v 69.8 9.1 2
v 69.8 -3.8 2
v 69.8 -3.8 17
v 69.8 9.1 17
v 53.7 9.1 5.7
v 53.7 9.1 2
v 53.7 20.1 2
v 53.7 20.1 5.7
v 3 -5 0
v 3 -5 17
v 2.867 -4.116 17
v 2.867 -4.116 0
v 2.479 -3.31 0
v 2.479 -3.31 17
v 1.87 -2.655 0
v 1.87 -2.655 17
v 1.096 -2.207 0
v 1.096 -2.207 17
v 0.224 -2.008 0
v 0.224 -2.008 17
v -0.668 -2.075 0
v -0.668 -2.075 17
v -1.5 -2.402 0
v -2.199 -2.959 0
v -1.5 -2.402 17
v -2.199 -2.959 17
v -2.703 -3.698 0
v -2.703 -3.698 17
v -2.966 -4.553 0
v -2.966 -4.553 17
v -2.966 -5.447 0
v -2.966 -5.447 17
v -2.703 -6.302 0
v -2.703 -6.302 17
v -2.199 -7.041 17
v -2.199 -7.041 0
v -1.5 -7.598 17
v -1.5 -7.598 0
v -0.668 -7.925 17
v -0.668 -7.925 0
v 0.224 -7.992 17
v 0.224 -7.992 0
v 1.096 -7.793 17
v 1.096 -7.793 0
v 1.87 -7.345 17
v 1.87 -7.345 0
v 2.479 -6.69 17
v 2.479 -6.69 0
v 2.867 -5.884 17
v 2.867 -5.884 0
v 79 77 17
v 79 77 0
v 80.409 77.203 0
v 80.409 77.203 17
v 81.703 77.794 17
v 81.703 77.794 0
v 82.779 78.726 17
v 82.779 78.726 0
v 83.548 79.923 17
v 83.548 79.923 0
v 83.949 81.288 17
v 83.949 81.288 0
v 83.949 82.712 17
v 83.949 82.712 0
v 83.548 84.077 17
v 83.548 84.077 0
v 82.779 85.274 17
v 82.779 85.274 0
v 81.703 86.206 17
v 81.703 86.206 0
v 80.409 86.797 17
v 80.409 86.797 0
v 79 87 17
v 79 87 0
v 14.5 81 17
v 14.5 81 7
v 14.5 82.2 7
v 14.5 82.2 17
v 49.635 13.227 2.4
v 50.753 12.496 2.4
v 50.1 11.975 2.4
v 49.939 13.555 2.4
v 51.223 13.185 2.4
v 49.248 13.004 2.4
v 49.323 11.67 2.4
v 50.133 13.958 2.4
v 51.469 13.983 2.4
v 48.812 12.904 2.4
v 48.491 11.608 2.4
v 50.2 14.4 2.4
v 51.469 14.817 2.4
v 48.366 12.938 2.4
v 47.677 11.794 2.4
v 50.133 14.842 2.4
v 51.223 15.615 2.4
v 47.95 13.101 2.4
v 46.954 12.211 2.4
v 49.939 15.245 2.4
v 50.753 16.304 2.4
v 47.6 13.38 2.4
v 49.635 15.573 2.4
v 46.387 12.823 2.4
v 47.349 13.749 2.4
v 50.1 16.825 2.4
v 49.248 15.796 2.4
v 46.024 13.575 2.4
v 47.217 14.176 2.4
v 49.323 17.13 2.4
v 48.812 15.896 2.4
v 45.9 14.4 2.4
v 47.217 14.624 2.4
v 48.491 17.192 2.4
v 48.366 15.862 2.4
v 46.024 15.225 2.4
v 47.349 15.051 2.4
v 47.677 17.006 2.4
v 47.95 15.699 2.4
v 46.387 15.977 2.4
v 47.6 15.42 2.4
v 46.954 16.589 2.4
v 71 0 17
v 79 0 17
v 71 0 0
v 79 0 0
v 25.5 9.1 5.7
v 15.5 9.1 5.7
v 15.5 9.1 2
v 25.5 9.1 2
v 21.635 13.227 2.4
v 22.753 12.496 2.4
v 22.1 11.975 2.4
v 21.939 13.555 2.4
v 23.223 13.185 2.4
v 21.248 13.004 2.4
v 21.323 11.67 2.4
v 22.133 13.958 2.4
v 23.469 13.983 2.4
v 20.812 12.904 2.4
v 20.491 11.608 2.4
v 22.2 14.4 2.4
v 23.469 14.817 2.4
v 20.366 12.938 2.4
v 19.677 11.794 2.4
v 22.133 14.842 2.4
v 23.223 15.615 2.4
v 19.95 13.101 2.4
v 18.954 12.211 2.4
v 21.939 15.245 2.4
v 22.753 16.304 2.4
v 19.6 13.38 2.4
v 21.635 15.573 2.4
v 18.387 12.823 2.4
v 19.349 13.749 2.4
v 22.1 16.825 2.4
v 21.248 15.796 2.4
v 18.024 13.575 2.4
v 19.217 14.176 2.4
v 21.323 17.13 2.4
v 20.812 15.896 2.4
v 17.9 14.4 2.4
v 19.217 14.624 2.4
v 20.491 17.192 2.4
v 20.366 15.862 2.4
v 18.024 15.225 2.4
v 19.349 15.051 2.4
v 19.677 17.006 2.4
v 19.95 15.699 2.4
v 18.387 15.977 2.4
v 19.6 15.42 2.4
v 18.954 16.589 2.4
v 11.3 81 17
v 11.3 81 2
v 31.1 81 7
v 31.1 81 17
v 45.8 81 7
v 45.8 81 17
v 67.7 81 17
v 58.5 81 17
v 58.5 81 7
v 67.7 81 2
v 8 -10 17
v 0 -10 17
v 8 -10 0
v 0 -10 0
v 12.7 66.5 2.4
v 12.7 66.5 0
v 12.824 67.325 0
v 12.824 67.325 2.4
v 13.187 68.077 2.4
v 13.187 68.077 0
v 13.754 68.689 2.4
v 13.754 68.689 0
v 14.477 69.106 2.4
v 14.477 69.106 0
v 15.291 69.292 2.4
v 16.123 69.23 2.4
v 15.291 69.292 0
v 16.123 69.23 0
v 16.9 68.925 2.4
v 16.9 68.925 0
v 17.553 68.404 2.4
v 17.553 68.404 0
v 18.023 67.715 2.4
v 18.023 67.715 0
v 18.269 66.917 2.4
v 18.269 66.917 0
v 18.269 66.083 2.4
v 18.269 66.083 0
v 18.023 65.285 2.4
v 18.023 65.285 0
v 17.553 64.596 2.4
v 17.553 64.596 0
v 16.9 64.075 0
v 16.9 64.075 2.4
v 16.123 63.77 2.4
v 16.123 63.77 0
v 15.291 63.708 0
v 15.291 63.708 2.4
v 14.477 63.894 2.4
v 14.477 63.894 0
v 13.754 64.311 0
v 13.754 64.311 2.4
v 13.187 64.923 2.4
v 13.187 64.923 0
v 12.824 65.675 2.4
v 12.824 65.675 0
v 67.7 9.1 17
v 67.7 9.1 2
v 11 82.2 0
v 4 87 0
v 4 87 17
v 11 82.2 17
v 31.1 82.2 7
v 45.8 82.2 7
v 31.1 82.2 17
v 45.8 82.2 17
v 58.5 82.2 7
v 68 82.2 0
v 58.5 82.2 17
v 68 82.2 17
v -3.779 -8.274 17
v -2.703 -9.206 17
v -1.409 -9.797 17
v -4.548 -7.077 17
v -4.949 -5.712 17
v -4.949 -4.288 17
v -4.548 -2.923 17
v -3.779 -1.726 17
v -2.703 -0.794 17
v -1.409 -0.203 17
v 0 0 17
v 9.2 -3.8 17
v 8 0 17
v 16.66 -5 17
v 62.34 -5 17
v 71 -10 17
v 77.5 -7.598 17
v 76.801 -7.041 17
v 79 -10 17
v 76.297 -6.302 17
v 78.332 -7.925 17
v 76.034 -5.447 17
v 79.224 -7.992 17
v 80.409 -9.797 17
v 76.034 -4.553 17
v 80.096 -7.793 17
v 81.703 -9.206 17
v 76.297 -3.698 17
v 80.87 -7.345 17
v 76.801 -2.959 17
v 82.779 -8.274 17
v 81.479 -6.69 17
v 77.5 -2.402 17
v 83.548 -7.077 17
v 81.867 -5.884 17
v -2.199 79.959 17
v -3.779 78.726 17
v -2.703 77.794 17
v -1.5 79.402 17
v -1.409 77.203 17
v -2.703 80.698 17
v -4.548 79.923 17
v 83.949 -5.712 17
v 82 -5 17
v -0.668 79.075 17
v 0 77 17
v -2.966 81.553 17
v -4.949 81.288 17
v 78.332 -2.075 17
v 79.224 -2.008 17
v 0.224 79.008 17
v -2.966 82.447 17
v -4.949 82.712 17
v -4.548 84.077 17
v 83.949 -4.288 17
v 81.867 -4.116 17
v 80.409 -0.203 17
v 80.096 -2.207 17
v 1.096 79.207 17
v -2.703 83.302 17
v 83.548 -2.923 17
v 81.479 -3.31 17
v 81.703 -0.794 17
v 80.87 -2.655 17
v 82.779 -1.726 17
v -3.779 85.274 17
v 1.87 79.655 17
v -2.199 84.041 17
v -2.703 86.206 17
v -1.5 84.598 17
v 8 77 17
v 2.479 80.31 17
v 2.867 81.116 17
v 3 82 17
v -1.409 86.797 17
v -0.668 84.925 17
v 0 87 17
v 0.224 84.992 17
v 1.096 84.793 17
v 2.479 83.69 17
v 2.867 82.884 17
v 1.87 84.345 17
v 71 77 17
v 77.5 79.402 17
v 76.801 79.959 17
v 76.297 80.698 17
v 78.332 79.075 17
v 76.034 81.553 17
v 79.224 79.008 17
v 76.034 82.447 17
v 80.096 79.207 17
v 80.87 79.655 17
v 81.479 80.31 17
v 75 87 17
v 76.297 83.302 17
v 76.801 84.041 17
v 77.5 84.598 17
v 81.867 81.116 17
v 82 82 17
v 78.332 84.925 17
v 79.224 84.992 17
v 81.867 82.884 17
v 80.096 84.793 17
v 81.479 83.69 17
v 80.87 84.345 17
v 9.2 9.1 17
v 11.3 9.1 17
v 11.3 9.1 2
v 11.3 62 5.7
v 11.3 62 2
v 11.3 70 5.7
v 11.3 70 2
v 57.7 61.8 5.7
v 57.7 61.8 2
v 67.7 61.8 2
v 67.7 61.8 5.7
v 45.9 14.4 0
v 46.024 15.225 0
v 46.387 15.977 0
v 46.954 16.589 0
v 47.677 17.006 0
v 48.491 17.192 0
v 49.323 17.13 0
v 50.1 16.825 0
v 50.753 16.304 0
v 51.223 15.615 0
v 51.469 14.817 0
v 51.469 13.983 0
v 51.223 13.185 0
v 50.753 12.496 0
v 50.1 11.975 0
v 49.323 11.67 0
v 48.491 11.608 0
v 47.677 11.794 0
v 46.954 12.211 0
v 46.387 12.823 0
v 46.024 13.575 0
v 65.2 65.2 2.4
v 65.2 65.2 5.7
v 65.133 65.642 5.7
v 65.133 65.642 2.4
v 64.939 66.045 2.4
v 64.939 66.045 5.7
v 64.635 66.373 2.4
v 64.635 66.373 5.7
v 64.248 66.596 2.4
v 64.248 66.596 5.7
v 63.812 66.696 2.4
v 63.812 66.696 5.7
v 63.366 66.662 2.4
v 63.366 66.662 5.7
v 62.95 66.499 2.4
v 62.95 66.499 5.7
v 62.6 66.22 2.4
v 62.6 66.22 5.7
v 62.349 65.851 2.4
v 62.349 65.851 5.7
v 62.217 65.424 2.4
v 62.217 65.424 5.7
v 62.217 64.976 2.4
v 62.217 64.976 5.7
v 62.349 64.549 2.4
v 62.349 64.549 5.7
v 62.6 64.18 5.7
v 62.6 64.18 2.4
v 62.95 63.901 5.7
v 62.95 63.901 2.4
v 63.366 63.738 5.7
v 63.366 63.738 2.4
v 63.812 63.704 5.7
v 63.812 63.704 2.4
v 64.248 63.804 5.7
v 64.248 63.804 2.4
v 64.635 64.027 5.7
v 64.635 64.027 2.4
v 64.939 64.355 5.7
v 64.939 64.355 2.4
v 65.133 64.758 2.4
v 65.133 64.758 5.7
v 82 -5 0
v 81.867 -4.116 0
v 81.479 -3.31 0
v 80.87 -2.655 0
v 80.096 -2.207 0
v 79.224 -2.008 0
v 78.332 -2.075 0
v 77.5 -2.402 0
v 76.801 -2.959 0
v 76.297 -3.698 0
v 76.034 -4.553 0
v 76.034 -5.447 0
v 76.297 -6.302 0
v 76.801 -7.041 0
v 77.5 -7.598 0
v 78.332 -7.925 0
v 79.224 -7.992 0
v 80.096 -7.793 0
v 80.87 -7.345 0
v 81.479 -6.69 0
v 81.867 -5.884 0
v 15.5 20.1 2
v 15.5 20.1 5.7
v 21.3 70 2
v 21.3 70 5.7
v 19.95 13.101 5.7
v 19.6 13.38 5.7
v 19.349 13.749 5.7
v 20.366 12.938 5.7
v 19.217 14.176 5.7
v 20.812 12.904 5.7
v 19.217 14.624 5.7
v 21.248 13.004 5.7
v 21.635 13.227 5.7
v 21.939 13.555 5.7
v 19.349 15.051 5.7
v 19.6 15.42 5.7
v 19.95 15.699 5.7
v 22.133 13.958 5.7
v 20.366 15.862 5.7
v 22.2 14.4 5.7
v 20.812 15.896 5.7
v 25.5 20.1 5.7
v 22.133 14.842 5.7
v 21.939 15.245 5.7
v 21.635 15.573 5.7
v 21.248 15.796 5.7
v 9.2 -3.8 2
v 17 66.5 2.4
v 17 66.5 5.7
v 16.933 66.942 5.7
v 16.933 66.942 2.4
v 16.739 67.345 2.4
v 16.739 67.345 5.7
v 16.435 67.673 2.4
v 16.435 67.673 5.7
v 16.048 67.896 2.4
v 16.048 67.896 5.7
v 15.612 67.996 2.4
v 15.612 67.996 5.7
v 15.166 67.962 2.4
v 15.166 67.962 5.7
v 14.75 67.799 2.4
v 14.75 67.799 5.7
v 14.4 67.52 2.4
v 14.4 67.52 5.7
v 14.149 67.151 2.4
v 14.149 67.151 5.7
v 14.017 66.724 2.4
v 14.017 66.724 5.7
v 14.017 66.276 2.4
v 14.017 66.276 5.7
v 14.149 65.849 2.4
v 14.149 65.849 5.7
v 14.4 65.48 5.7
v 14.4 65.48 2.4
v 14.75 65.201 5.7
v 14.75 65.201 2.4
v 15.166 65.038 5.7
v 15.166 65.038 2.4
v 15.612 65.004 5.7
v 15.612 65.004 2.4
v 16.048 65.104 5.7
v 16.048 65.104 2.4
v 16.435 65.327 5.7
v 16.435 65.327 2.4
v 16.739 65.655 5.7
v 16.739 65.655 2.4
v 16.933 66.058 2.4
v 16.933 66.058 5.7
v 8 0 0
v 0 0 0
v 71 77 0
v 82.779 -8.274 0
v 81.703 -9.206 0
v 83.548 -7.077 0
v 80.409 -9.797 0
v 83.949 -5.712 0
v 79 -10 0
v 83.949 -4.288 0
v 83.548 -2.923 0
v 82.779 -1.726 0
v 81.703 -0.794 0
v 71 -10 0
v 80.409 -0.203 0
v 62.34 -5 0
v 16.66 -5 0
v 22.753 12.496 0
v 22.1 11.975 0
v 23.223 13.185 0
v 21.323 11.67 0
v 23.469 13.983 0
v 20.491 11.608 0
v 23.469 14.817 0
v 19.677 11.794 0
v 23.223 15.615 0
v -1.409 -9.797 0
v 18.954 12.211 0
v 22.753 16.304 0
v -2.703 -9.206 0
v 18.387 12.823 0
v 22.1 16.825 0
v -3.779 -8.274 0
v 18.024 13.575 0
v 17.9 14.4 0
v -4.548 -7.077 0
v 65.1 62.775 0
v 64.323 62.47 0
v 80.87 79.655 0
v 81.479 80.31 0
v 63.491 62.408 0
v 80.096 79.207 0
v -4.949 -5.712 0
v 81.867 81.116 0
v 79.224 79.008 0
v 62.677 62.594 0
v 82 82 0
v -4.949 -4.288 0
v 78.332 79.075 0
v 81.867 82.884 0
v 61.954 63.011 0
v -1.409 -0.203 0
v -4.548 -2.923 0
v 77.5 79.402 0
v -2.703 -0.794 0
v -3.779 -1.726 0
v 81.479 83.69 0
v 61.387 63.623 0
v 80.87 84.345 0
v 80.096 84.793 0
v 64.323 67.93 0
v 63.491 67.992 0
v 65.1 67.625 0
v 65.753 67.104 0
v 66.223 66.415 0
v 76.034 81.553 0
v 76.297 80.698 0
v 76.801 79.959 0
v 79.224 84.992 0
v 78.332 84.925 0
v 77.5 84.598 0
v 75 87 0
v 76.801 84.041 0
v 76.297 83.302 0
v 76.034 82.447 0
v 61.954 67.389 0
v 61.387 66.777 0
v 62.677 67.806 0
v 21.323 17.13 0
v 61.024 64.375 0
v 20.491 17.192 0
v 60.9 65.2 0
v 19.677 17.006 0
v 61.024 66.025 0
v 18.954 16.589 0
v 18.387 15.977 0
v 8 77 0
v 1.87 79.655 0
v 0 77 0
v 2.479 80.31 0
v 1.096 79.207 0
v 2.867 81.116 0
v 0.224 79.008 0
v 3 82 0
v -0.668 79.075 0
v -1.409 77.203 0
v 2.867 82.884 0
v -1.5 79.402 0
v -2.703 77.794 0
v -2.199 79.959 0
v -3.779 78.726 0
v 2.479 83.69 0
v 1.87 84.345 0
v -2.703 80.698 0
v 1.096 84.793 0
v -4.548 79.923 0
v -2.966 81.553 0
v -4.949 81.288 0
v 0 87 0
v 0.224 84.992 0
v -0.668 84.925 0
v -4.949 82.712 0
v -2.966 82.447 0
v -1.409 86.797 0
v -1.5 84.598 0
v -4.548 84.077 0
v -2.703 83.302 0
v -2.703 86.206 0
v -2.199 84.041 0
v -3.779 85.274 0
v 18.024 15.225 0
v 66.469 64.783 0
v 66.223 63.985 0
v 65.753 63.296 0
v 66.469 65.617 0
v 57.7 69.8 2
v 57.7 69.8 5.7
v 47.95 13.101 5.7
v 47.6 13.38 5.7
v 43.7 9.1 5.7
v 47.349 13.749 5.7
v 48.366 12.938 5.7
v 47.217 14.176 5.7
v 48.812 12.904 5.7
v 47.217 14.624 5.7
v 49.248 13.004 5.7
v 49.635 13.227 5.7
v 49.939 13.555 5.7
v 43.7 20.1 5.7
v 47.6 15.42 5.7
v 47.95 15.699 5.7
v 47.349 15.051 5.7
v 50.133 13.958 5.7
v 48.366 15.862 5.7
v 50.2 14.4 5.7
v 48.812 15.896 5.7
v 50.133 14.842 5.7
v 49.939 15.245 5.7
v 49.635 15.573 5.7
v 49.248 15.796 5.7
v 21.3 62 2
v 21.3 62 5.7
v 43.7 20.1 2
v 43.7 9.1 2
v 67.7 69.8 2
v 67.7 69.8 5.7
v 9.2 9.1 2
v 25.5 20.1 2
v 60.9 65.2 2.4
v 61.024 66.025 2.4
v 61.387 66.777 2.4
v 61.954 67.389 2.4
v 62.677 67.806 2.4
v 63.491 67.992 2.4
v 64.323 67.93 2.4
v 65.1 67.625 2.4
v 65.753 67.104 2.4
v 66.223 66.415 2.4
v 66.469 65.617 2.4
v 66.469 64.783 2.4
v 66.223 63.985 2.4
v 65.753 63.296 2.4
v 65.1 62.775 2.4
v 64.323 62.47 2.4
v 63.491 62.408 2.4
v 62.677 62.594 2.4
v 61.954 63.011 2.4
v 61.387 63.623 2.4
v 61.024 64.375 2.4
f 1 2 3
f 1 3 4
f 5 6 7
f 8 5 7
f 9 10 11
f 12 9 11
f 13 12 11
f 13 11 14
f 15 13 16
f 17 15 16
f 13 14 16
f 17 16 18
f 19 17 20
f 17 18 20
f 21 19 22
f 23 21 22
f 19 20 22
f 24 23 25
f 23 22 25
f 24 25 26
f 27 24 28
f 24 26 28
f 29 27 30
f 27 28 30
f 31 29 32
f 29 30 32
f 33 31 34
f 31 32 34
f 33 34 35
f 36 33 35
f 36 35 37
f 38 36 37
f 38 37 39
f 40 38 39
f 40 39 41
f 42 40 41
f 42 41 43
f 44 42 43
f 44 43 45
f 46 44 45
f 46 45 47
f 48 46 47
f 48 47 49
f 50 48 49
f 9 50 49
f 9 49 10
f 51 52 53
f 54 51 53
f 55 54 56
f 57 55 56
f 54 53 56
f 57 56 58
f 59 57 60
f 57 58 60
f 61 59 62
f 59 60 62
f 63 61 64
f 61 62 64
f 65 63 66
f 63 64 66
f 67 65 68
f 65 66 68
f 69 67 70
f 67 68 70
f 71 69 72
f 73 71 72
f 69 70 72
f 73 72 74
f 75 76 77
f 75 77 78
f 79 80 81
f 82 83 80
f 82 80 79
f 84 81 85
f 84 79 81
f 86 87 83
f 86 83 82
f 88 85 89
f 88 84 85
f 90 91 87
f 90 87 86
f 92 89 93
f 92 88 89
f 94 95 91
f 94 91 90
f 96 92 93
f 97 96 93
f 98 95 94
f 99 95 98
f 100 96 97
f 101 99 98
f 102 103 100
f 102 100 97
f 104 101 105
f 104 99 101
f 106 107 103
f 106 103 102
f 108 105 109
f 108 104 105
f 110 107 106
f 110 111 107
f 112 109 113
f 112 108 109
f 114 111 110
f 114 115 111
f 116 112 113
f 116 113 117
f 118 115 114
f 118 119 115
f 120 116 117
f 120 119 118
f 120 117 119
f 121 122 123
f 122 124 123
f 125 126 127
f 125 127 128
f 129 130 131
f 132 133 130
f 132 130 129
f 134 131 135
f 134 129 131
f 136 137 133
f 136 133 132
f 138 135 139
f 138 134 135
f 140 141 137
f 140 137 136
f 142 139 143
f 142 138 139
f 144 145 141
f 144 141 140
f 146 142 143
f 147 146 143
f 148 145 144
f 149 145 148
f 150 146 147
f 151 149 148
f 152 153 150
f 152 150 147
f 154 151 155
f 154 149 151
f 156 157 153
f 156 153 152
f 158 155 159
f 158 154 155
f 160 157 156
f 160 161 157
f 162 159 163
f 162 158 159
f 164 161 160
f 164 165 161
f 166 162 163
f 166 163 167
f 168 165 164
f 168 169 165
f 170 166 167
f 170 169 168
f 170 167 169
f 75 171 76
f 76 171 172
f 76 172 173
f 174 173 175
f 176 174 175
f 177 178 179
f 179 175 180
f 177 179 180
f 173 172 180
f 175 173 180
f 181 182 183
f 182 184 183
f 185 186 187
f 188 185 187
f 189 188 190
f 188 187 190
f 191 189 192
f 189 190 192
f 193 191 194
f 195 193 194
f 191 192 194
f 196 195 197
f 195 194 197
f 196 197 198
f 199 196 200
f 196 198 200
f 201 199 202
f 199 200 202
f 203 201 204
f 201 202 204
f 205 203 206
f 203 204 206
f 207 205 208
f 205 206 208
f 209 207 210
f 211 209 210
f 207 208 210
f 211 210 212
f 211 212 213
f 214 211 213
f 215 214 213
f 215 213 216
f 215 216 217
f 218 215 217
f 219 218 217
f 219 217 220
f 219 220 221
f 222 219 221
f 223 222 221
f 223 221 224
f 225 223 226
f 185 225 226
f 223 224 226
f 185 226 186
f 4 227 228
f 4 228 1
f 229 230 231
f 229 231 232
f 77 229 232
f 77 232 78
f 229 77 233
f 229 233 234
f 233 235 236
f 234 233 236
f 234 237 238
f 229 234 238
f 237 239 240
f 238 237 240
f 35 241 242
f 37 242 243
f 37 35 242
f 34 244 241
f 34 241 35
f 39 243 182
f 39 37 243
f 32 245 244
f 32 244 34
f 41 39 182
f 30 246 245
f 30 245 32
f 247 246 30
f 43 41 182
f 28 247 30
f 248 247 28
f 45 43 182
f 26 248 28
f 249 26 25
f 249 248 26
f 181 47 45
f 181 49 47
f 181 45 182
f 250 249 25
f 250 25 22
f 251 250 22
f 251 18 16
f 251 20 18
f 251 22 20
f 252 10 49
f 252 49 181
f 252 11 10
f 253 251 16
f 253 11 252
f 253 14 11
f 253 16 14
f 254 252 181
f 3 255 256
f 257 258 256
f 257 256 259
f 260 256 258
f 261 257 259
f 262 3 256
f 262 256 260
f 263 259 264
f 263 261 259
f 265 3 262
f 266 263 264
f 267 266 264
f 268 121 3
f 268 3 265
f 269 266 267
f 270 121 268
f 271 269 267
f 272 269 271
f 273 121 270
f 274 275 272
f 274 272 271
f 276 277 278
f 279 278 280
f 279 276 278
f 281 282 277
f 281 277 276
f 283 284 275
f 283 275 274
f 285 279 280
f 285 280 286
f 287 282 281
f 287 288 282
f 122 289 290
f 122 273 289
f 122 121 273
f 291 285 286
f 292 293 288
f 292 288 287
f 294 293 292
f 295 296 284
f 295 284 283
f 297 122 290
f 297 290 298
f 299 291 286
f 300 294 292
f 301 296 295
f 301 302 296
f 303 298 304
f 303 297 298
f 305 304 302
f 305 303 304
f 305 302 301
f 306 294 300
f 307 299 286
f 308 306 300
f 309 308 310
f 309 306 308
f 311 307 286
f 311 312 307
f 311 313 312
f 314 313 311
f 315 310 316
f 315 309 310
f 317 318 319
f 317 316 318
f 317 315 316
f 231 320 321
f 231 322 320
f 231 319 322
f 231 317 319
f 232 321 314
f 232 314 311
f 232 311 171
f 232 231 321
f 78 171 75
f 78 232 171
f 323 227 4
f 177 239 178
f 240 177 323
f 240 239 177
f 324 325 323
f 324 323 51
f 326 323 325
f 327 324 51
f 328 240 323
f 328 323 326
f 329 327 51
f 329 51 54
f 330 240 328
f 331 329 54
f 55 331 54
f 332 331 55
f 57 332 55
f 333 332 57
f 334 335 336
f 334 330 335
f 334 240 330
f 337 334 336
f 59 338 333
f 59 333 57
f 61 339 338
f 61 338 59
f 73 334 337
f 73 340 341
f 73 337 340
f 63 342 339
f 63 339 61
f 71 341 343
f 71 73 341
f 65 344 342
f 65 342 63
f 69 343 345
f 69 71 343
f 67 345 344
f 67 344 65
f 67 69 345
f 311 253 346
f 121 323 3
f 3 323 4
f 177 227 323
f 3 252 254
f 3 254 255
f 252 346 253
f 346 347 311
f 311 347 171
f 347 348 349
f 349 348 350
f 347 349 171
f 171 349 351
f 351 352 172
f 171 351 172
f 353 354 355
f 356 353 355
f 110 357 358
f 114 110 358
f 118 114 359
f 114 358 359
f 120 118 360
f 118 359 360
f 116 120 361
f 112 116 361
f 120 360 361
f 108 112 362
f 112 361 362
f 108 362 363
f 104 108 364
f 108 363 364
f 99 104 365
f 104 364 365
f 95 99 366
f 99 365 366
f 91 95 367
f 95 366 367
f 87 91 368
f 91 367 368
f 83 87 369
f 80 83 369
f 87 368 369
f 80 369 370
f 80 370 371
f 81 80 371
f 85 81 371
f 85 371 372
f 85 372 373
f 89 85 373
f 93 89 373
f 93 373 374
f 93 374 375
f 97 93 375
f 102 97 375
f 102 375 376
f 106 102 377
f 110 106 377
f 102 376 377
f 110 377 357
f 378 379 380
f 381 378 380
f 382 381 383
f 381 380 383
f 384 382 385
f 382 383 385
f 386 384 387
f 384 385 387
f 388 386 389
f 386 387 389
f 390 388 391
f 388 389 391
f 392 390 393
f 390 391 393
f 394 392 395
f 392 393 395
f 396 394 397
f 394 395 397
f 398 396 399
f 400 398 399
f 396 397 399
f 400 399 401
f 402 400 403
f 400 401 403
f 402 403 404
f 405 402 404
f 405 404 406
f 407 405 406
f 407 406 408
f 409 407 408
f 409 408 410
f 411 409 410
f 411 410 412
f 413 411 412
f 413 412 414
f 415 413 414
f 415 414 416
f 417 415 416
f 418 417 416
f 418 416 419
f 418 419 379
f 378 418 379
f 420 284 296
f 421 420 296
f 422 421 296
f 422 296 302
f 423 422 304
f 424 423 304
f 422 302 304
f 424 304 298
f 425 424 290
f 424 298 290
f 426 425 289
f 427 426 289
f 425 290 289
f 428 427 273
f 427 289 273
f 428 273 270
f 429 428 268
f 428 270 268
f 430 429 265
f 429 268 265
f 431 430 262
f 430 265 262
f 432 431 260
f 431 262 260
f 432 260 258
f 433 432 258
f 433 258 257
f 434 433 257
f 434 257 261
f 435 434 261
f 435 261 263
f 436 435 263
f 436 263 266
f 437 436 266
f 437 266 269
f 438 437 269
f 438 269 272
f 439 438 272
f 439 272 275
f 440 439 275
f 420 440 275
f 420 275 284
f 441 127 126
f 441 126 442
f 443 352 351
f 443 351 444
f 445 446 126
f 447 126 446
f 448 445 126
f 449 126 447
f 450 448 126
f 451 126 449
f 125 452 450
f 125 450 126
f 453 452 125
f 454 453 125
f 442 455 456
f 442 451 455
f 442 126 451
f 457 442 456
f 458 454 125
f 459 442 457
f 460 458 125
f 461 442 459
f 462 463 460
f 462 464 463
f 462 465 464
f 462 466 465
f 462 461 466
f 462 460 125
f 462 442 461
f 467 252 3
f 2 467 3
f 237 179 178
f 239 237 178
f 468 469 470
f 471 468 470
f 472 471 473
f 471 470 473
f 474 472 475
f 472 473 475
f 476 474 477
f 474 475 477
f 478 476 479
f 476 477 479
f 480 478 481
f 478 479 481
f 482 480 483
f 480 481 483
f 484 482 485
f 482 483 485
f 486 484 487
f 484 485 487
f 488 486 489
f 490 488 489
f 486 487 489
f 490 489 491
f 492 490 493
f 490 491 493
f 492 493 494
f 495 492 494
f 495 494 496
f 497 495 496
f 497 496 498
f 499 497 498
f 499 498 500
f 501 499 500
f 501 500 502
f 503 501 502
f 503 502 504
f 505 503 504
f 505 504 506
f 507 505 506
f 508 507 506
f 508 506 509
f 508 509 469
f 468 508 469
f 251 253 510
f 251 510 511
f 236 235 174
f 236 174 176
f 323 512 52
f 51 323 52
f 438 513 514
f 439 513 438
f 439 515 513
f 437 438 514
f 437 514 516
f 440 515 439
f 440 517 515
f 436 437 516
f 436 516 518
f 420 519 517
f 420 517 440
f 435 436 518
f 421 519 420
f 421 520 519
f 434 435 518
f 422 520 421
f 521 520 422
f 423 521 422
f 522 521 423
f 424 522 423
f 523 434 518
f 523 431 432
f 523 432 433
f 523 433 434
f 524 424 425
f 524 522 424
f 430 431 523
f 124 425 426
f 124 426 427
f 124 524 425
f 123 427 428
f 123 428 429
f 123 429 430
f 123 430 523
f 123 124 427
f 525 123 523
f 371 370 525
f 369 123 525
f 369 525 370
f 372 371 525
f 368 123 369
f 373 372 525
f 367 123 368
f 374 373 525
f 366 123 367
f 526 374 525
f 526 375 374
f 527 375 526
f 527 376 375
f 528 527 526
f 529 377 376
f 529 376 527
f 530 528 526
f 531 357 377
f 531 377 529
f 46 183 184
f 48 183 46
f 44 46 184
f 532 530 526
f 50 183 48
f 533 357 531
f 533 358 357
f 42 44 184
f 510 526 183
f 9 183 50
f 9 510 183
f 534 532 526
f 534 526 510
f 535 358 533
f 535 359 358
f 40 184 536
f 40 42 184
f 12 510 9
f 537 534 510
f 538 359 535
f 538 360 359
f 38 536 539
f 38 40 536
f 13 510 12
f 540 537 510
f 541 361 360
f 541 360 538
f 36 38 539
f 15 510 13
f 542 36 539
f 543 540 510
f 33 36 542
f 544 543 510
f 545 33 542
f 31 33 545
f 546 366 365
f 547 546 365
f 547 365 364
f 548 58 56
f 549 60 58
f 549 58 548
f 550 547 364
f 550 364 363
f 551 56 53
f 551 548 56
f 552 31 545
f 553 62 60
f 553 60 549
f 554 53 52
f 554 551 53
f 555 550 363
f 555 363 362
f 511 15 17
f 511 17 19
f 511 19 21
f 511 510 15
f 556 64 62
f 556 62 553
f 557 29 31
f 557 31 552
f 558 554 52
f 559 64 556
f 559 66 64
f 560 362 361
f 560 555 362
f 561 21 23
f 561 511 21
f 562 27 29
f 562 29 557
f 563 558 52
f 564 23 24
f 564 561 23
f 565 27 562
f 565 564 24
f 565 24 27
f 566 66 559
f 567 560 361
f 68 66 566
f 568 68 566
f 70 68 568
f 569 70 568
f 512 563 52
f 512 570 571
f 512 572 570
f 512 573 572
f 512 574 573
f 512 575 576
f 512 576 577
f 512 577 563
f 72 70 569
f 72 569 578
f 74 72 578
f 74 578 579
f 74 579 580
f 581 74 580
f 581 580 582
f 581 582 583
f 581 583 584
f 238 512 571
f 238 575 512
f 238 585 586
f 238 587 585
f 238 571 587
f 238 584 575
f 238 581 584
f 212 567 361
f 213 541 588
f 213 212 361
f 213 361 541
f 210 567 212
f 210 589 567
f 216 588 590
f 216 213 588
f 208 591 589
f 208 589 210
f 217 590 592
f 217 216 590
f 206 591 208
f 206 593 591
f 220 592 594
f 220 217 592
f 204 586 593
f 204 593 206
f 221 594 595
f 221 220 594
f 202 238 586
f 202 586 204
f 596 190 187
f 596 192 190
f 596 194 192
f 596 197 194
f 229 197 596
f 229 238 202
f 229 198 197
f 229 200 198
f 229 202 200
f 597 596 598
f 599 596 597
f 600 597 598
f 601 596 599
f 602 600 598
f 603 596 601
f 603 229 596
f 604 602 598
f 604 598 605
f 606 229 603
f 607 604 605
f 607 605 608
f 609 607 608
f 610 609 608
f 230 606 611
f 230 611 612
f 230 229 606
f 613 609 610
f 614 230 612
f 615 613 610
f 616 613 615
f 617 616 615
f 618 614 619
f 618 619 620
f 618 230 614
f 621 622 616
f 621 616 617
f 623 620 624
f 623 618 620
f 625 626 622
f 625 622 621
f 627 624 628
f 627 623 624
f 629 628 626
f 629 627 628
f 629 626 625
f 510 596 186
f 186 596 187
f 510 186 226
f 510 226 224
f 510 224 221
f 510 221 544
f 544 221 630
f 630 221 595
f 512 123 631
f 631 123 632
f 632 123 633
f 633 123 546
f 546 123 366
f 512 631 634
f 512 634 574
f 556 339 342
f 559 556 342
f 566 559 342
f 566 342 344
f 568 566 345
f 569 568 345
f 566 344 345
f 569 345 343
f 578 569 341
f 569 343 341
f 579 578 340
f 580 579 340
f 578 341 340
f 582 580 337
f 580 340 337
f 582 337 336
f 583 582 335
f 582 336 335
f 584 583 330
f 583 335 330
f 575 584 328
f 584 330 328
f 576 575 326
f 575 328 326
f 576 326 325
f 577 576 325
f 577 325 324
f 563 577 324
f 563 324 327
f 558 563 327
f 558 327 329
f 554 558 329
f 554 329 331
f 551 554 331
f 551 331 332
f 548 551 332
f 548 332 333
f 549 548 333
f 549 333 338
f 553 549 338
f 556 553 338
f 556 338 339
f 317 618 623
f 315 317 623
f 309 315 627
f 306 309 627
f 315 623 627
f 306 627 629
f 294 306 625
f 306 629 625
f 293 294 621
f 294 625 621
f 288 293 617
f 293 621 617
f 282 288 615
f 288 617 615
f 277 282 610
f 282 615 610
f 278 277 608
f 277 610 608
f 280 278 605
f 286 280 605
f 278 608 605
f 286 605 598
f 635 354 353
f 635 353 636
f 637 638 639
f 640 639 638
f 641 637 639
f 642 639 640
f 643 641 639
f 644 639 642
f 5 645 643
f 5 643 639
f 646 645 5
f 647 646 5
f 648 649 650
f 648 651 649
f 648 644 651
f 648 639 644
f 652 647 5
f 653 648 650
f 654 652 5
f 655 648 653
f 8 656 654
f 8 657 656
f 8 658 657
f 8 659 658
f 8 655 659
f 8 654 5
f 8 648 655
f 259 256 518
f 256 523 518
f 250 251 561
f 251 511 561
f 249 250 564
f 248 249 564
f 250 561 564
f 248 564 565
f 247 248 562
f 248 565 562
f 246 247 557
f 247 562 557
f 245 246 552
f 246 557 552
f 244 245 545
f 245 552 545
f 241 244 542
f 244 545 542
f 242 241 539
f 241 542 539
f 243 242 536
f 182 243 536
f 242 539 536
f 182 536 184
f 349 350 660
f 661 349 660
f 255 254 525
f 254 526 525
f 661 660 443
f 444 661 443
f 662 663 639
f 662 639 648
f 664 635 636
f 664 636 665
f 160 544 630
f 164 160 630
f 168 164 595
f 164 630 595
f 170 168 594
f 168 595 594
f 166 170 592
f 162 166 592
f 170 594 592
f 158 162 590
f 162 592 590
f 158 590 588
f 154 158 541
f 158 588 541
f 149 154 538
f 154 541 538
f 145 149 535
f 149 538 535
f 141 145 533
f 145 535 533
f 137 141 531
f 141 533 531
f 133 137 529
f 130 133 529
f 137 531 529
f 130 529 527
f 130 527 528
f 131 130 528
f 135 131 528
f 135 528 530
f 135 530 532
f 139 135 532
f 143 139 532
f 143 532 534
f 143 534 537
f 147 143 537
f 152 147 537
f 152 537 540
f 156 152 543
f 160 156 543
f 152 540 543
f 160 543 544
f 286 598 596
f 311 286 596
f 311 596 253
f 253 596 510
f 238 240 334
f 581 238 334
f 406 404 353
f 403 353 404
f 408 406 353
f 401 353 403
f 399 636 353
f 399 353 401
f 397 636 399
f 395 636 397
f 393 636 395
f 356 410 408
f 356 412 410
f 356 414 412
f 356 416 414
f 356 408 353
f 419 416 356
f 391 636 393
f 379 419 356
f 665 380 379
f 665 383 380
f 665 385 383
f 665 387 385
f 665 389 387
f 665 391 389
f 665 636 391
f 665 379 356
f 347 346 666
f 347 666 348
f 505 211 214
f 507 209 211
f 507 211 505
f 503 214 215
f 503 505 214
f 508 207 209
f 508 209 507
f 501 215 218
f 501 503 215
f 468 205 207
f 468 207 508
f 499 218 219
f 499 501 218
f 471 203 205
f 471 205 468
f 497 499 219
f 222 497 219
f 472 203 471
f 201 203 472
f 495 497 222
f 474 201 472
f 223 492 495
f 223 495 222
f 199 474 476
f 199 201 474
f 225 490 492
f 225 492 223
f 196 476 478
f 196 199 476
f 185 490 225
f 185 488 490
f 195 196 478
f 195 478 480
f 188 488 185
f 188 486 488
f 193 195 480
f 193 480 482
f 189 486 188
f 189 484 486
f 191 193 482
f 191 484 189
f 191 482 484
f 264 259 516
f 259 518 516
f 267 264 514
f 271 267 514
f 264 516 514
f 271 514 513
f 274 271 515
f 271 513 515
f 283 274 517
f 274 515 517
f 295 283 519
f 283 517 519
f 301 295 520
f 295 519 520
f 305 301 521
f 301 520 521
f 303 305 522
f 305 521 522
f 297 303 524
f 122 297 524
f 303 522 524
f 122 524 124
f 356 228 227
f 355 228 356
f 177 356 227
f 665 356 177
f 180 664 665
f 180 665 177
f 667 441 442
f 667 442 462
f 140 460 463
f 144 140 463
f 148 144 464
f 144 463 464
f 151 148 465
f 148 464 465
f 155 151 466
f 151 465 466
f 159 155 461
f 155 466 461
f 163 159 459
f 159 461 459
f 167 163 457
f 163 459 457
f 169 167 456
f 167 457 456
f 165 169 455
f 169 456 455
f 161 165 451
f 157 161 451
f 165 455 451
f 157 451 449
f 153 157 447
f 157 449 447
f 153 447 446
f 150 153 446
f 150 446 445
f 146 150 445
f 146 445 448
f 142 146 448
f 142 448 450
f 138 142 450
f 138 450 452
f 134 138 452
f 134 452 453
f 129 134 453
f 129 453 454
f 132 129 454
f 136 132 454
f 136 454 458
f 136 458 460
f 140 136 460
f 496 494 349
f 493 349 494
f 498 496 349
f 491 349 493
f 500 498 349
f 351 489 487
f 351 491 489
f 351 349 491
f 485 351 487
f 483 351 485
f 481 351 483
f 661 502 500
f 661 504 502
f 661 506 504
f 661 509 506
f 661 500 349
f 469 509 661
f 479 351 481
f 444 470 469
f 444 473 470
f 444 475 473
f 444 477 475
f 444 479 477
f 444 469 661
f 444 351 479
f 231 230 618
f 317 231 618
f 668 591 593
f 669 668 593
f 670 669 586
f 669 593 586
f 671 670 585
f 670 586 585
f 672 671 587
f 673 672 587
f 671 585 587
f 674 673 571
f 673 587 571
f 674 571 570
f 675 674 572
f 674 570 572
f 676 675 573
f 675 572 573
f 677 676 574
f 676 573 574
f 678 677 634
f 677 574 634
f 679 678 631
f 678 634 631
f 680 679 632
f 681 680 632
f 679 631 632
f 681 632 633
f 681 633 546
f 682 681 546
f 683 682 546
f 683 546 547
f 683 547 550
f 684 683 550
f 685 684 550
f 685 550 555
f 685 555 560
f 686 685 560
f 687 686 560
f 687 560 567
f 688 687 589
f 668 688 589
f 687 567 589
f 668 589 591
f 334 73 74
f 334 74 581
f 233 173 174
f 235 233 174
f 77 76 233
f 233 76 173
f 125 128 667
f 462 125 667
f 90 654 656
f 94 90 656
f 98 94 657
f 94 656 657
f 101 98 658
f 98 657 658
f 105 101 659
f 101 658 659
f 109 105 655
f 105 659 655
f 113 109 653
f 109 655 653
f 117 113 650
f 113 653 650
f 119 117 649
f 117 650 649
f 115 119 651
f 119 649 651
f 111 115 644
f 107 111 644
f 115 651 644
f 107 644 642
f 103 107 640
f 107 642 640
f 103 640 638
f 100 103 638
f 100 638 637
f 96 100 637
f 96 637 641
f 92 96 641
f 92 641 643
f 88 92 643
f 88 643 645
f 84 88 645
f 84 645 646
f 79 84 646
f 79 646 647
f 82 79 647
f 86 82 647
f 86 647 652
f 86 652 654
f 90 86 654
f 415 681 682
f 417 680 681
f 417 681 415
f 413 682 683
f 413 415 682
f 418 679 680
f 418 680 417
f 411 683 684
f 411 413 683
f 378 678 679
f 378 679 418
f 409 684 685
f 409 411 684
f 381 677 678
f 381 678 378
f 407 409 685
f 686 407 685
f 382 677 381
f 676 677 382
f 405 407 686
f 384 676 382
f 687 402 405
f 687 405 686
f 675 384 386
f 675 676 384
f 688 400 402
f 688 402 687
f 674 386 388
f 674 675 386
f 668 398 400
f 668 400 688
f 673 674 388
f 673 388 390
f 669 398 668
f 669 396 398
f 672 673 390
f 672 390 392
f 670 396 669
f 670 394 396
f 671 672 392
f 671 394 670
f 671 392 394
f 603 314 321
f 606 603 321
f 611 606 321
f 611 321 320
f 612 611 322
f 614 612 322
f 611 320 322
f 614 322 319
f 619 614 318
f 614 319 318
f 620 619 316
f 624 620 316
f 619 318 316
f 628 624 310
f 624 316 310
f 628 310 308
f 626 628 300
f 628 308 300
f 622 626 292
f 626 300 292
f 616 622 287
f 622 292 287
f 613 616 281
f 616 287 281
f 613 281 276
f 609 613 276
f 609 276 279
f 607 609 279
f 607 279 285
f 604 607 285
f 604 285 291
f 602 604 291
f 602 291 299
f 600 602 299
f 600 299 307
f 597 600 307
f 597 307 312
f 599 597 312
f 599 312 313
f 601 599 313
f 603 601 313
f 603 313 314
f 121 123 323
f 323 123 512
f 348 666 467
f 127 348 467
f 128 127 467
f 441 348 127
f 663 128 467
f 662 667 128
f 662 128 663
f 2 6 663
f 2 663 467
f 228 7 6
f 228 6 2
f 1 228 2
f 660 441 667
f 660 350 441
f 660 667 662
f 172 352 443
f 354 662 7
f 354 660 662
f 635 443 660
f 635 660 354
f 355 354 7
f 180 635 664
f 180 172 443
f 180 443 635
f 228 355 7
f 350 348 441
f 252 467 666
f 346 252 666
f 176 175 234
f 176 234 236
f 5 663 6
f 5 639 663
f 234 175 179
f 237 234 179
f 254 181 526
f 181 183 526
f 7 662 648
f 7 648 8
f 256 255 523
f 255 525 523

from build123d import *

# Parameters (mm, degrees)
EXTRUDE_1_DEPTH          = 2
SKETCH_2_W               = 56.4
SKETCH_2_H               = 71.9
EXTRUDE_3_DEPTH          = 15
SKETCH_6_R               = 3
CUT_EXTRUDE_1_DEPTH      = 18
SKETCH_7_W               = 10
SKETCH_7_H               = 8
SKETCH_7_H_2             = 11
EXTRUDE_4_DEPTH          = 3.7
SKETCH_8_R               = 1.5
CUT_EXTRUDE_2_DEPTH      = 6.7
CUT_EXTRUDE_5_DEPTH      = 1
CUT_EXTRUDE_5_DEPTH_BACK = 18
SKETCH_14_W              = 60.6
SKETCH_14_H              = 12.9
CUT_EXTRUDE_10_DEPTH     = 15
SKETCH_10_W              = 16.6
SKETCH_10_H              = 10
SKETCH_10_W_2            = 12.7
CUT_EXTRUDE_12_DEPTH     = 10
SKETCH_15_R              = 2.8
CUT_EXTRUDE_15_DEPTH     = 2.4


with BuildPart() as part:
    # 草图1 → 凸台-拉伸1 (new body)
    with BuildSketch(Plane.XY):
        with BuildLine():
            Line((0, 0), (8, 0))
            Line((8, 0), (8, 77))
            Line((8, 77), (0, 77))
            ThreePointArc((0, 77), (-5, 82), (0, 87))
            Line((0, 87), (79, 87))
            ThreePointArc((79, 87), (84, 82), (79, 77))
            Line((79, 77), (71, 77))
            Line((71, 77), (71, 0))
            Line((71, 0), (79, 0))
            ThreePointArc((79, 0), (84, -5), (79, -10))
            Line((79, -10), (71, -10))
            Line((71, -10), (62.339745962, -5))
            Line((62.339745962, -5), (16.660254038, -5))
            Line((16.660254038, -5), (8, -10))
            Line((8, -10), (0, -10))
            ThreePointArc((0, -10), (-5, -5), (0, 0))
        make_face()
    extrude(amount=EXTRUDE_1_DEPTH)

    # 草图2 → 凸台-拉伸3 (add)
    with BuildSketch(Plane.XY.offset(2)):
        with BuildLine():
            Line((8, 0), (0, 0))
            ThreePointArc((0, 0), (-5, -5), (0, -10))
            Line((0, -10), (8, -10))
            Line((8, -10), (16.660254038, -5))
            Line((16.660254038, -5), (62.339745962, -5))
            Line((62.339745962, -5), (71, -10))
            Line((71, -10), (79, -10))
            ThreePointArc((79, -10), (84, -5), (79, 0))
            Line((79, 0), (71, 0))
            Line((71, 0), (71, 77))
            Line((71, 77), (79, 77))
            ThreePointArc((79, 77), (84, 82), (79, 87))
            Line((79, 87), (0, 87))
            ThreePointArc((0, 87), (-5, 82), (0, 77))
            Line((0, 77), (8, 77))
            Line((8, 77), (8, 0))
        make_face()
        with Locations((39.5, 45.05)):
            Rectangle(SKETCH_2_W, SKETCH_2_H, mode=Mode.SUBTRACT)
    extrude(amount=EXTRUDE_3_DEPTH)

    # 草图6 → 切除-拉伸1 (cut, through all)
    with BuildSketch(Plane.XY.offset(17)):
        with Locations((0, 82)):
            Circle(SKETCH_6_R)
        with Locations((0, -5)):
            Circle(SKETCH_6_R)
        with Locations((79, -5)):
            Circle(SKETCH_6_R)
        with Locations((79, 82)):
            Circle(SKETCH_6_R)
    extrude(amount=-CUT_EXTRUDE_1_DEPTH, mode=Mode.SUBTRACT)

    # 草图7 → 凸台-拉伸4 (add)
    with BuildSketch(Plane.XY.offset(2)):
        with Locations((62.7, 65.8)):
            Rectangle(SKETCH_7_W, SKETCH_7_H)
        with Locations((16.3, 66)):
            Rectangle(SKETCH_7_W, SKETCH_7_H)
        with Locations((48.7, 14.6)):
            Rectangle(SKETCH_7_W, SKETCH_7_H_2)
        with Locations((20.5, 14.6)):
            Rectangle(SKETCH_7_W, SKETCH_7_H_2)
    extrude(amount=EXTRUDE_4_DEPTH)

    # 草图8 → 切除-拉伸2 (cut, through all)
    with BuildSketch(Plane.XY.offset(5.7)):
        with Locations((63.7, 65.2)):
            Circle(SKETCH_8_R)
        with Locations((15.5, 66.5)):
            Circle(SKETCH_8_R)
        with Locations((20.7, 14.4)):
            Circle(SKETCH_8_R)
        with Locations((48.7, 14.4)):
            Circle(SKETCH_8_R)
    extrude(amount=-CUT_EXTRUDE_2_DEPTH, mode=Mode.SUBTRACT)

    # 草图11 → 切除-拉伸5 (cut, two sides)
    with BuildSketch(Plane.XY.offset(17)) as cut_extrude_5_sk:
        Polygon((-211.639949222, 234.867393752), (4, 87), (11, 82.2), (68, 82.2), (75, 87), (290.639949222, 234.867393752), (290.639949222, 757.802777275), (-211.639949222, 757.802777275), align=None)
    extrude(amount=CUT_EXTRUDE_5_DEPTH, mode=Mode.SUBTRACT)
    extrude(cut_extrude_5_sk.sketch, amount=-CUT_EXTRUDE_5_DEPTH_BACK, mode=Mode.SUBTRACT)

    # 草图14 → 切除-拉伸10 (cut)
    with BuildSketch(Plane.XY.offset(17)):
        with Locations((39.5, 2.65)):
            Rectangle(SKETCH_14_W, SKETCH_14_H)
    extrude(amount=-CUT_EXTRUDE_10_DEPTH, mode=Mode.SUBTRACT)

    # 草图10 → 切除-拉伸12 (cut)
    with BuildSketch(Plane.XZ.offset(-81)):
        with Locations((22.8, 12)):
            Rectangle(SKETCH_10_W, SKETCH_10_H)
        with Locations((52.15, 12)):
            Rectangle(SKETCH_10_W_2, SKETCH_10_H)
    extrude(amount=-CUT_EXTRUDE_12_DEPTH, mode=Mode.SUBTRACT)

    # 草图15 → 切除-拉伸15 (cut)
    with BuildSketch(Plane(origin=(0, 0, 0), x_dir=(-1, 0, 0), z_dir=(0, 0, -1))):
        with Locations((-15.5, 66.5)):
            Circle(SKETCH_15_R)
        with Locations((-20.7, 14.4)):
            Circle(SKETCH_15_R)
        with Locations((-48.7, 14.4)):
            Circle(SKETCH_15_R)
        with Locations((-63.7, 65.2)):
            Circle(SKETCH_15_R)
    extrude(amount=-CUT_EXTRUDE_15_DEPTH, mode=Mode.SUBTRACT)


solid = part.part
